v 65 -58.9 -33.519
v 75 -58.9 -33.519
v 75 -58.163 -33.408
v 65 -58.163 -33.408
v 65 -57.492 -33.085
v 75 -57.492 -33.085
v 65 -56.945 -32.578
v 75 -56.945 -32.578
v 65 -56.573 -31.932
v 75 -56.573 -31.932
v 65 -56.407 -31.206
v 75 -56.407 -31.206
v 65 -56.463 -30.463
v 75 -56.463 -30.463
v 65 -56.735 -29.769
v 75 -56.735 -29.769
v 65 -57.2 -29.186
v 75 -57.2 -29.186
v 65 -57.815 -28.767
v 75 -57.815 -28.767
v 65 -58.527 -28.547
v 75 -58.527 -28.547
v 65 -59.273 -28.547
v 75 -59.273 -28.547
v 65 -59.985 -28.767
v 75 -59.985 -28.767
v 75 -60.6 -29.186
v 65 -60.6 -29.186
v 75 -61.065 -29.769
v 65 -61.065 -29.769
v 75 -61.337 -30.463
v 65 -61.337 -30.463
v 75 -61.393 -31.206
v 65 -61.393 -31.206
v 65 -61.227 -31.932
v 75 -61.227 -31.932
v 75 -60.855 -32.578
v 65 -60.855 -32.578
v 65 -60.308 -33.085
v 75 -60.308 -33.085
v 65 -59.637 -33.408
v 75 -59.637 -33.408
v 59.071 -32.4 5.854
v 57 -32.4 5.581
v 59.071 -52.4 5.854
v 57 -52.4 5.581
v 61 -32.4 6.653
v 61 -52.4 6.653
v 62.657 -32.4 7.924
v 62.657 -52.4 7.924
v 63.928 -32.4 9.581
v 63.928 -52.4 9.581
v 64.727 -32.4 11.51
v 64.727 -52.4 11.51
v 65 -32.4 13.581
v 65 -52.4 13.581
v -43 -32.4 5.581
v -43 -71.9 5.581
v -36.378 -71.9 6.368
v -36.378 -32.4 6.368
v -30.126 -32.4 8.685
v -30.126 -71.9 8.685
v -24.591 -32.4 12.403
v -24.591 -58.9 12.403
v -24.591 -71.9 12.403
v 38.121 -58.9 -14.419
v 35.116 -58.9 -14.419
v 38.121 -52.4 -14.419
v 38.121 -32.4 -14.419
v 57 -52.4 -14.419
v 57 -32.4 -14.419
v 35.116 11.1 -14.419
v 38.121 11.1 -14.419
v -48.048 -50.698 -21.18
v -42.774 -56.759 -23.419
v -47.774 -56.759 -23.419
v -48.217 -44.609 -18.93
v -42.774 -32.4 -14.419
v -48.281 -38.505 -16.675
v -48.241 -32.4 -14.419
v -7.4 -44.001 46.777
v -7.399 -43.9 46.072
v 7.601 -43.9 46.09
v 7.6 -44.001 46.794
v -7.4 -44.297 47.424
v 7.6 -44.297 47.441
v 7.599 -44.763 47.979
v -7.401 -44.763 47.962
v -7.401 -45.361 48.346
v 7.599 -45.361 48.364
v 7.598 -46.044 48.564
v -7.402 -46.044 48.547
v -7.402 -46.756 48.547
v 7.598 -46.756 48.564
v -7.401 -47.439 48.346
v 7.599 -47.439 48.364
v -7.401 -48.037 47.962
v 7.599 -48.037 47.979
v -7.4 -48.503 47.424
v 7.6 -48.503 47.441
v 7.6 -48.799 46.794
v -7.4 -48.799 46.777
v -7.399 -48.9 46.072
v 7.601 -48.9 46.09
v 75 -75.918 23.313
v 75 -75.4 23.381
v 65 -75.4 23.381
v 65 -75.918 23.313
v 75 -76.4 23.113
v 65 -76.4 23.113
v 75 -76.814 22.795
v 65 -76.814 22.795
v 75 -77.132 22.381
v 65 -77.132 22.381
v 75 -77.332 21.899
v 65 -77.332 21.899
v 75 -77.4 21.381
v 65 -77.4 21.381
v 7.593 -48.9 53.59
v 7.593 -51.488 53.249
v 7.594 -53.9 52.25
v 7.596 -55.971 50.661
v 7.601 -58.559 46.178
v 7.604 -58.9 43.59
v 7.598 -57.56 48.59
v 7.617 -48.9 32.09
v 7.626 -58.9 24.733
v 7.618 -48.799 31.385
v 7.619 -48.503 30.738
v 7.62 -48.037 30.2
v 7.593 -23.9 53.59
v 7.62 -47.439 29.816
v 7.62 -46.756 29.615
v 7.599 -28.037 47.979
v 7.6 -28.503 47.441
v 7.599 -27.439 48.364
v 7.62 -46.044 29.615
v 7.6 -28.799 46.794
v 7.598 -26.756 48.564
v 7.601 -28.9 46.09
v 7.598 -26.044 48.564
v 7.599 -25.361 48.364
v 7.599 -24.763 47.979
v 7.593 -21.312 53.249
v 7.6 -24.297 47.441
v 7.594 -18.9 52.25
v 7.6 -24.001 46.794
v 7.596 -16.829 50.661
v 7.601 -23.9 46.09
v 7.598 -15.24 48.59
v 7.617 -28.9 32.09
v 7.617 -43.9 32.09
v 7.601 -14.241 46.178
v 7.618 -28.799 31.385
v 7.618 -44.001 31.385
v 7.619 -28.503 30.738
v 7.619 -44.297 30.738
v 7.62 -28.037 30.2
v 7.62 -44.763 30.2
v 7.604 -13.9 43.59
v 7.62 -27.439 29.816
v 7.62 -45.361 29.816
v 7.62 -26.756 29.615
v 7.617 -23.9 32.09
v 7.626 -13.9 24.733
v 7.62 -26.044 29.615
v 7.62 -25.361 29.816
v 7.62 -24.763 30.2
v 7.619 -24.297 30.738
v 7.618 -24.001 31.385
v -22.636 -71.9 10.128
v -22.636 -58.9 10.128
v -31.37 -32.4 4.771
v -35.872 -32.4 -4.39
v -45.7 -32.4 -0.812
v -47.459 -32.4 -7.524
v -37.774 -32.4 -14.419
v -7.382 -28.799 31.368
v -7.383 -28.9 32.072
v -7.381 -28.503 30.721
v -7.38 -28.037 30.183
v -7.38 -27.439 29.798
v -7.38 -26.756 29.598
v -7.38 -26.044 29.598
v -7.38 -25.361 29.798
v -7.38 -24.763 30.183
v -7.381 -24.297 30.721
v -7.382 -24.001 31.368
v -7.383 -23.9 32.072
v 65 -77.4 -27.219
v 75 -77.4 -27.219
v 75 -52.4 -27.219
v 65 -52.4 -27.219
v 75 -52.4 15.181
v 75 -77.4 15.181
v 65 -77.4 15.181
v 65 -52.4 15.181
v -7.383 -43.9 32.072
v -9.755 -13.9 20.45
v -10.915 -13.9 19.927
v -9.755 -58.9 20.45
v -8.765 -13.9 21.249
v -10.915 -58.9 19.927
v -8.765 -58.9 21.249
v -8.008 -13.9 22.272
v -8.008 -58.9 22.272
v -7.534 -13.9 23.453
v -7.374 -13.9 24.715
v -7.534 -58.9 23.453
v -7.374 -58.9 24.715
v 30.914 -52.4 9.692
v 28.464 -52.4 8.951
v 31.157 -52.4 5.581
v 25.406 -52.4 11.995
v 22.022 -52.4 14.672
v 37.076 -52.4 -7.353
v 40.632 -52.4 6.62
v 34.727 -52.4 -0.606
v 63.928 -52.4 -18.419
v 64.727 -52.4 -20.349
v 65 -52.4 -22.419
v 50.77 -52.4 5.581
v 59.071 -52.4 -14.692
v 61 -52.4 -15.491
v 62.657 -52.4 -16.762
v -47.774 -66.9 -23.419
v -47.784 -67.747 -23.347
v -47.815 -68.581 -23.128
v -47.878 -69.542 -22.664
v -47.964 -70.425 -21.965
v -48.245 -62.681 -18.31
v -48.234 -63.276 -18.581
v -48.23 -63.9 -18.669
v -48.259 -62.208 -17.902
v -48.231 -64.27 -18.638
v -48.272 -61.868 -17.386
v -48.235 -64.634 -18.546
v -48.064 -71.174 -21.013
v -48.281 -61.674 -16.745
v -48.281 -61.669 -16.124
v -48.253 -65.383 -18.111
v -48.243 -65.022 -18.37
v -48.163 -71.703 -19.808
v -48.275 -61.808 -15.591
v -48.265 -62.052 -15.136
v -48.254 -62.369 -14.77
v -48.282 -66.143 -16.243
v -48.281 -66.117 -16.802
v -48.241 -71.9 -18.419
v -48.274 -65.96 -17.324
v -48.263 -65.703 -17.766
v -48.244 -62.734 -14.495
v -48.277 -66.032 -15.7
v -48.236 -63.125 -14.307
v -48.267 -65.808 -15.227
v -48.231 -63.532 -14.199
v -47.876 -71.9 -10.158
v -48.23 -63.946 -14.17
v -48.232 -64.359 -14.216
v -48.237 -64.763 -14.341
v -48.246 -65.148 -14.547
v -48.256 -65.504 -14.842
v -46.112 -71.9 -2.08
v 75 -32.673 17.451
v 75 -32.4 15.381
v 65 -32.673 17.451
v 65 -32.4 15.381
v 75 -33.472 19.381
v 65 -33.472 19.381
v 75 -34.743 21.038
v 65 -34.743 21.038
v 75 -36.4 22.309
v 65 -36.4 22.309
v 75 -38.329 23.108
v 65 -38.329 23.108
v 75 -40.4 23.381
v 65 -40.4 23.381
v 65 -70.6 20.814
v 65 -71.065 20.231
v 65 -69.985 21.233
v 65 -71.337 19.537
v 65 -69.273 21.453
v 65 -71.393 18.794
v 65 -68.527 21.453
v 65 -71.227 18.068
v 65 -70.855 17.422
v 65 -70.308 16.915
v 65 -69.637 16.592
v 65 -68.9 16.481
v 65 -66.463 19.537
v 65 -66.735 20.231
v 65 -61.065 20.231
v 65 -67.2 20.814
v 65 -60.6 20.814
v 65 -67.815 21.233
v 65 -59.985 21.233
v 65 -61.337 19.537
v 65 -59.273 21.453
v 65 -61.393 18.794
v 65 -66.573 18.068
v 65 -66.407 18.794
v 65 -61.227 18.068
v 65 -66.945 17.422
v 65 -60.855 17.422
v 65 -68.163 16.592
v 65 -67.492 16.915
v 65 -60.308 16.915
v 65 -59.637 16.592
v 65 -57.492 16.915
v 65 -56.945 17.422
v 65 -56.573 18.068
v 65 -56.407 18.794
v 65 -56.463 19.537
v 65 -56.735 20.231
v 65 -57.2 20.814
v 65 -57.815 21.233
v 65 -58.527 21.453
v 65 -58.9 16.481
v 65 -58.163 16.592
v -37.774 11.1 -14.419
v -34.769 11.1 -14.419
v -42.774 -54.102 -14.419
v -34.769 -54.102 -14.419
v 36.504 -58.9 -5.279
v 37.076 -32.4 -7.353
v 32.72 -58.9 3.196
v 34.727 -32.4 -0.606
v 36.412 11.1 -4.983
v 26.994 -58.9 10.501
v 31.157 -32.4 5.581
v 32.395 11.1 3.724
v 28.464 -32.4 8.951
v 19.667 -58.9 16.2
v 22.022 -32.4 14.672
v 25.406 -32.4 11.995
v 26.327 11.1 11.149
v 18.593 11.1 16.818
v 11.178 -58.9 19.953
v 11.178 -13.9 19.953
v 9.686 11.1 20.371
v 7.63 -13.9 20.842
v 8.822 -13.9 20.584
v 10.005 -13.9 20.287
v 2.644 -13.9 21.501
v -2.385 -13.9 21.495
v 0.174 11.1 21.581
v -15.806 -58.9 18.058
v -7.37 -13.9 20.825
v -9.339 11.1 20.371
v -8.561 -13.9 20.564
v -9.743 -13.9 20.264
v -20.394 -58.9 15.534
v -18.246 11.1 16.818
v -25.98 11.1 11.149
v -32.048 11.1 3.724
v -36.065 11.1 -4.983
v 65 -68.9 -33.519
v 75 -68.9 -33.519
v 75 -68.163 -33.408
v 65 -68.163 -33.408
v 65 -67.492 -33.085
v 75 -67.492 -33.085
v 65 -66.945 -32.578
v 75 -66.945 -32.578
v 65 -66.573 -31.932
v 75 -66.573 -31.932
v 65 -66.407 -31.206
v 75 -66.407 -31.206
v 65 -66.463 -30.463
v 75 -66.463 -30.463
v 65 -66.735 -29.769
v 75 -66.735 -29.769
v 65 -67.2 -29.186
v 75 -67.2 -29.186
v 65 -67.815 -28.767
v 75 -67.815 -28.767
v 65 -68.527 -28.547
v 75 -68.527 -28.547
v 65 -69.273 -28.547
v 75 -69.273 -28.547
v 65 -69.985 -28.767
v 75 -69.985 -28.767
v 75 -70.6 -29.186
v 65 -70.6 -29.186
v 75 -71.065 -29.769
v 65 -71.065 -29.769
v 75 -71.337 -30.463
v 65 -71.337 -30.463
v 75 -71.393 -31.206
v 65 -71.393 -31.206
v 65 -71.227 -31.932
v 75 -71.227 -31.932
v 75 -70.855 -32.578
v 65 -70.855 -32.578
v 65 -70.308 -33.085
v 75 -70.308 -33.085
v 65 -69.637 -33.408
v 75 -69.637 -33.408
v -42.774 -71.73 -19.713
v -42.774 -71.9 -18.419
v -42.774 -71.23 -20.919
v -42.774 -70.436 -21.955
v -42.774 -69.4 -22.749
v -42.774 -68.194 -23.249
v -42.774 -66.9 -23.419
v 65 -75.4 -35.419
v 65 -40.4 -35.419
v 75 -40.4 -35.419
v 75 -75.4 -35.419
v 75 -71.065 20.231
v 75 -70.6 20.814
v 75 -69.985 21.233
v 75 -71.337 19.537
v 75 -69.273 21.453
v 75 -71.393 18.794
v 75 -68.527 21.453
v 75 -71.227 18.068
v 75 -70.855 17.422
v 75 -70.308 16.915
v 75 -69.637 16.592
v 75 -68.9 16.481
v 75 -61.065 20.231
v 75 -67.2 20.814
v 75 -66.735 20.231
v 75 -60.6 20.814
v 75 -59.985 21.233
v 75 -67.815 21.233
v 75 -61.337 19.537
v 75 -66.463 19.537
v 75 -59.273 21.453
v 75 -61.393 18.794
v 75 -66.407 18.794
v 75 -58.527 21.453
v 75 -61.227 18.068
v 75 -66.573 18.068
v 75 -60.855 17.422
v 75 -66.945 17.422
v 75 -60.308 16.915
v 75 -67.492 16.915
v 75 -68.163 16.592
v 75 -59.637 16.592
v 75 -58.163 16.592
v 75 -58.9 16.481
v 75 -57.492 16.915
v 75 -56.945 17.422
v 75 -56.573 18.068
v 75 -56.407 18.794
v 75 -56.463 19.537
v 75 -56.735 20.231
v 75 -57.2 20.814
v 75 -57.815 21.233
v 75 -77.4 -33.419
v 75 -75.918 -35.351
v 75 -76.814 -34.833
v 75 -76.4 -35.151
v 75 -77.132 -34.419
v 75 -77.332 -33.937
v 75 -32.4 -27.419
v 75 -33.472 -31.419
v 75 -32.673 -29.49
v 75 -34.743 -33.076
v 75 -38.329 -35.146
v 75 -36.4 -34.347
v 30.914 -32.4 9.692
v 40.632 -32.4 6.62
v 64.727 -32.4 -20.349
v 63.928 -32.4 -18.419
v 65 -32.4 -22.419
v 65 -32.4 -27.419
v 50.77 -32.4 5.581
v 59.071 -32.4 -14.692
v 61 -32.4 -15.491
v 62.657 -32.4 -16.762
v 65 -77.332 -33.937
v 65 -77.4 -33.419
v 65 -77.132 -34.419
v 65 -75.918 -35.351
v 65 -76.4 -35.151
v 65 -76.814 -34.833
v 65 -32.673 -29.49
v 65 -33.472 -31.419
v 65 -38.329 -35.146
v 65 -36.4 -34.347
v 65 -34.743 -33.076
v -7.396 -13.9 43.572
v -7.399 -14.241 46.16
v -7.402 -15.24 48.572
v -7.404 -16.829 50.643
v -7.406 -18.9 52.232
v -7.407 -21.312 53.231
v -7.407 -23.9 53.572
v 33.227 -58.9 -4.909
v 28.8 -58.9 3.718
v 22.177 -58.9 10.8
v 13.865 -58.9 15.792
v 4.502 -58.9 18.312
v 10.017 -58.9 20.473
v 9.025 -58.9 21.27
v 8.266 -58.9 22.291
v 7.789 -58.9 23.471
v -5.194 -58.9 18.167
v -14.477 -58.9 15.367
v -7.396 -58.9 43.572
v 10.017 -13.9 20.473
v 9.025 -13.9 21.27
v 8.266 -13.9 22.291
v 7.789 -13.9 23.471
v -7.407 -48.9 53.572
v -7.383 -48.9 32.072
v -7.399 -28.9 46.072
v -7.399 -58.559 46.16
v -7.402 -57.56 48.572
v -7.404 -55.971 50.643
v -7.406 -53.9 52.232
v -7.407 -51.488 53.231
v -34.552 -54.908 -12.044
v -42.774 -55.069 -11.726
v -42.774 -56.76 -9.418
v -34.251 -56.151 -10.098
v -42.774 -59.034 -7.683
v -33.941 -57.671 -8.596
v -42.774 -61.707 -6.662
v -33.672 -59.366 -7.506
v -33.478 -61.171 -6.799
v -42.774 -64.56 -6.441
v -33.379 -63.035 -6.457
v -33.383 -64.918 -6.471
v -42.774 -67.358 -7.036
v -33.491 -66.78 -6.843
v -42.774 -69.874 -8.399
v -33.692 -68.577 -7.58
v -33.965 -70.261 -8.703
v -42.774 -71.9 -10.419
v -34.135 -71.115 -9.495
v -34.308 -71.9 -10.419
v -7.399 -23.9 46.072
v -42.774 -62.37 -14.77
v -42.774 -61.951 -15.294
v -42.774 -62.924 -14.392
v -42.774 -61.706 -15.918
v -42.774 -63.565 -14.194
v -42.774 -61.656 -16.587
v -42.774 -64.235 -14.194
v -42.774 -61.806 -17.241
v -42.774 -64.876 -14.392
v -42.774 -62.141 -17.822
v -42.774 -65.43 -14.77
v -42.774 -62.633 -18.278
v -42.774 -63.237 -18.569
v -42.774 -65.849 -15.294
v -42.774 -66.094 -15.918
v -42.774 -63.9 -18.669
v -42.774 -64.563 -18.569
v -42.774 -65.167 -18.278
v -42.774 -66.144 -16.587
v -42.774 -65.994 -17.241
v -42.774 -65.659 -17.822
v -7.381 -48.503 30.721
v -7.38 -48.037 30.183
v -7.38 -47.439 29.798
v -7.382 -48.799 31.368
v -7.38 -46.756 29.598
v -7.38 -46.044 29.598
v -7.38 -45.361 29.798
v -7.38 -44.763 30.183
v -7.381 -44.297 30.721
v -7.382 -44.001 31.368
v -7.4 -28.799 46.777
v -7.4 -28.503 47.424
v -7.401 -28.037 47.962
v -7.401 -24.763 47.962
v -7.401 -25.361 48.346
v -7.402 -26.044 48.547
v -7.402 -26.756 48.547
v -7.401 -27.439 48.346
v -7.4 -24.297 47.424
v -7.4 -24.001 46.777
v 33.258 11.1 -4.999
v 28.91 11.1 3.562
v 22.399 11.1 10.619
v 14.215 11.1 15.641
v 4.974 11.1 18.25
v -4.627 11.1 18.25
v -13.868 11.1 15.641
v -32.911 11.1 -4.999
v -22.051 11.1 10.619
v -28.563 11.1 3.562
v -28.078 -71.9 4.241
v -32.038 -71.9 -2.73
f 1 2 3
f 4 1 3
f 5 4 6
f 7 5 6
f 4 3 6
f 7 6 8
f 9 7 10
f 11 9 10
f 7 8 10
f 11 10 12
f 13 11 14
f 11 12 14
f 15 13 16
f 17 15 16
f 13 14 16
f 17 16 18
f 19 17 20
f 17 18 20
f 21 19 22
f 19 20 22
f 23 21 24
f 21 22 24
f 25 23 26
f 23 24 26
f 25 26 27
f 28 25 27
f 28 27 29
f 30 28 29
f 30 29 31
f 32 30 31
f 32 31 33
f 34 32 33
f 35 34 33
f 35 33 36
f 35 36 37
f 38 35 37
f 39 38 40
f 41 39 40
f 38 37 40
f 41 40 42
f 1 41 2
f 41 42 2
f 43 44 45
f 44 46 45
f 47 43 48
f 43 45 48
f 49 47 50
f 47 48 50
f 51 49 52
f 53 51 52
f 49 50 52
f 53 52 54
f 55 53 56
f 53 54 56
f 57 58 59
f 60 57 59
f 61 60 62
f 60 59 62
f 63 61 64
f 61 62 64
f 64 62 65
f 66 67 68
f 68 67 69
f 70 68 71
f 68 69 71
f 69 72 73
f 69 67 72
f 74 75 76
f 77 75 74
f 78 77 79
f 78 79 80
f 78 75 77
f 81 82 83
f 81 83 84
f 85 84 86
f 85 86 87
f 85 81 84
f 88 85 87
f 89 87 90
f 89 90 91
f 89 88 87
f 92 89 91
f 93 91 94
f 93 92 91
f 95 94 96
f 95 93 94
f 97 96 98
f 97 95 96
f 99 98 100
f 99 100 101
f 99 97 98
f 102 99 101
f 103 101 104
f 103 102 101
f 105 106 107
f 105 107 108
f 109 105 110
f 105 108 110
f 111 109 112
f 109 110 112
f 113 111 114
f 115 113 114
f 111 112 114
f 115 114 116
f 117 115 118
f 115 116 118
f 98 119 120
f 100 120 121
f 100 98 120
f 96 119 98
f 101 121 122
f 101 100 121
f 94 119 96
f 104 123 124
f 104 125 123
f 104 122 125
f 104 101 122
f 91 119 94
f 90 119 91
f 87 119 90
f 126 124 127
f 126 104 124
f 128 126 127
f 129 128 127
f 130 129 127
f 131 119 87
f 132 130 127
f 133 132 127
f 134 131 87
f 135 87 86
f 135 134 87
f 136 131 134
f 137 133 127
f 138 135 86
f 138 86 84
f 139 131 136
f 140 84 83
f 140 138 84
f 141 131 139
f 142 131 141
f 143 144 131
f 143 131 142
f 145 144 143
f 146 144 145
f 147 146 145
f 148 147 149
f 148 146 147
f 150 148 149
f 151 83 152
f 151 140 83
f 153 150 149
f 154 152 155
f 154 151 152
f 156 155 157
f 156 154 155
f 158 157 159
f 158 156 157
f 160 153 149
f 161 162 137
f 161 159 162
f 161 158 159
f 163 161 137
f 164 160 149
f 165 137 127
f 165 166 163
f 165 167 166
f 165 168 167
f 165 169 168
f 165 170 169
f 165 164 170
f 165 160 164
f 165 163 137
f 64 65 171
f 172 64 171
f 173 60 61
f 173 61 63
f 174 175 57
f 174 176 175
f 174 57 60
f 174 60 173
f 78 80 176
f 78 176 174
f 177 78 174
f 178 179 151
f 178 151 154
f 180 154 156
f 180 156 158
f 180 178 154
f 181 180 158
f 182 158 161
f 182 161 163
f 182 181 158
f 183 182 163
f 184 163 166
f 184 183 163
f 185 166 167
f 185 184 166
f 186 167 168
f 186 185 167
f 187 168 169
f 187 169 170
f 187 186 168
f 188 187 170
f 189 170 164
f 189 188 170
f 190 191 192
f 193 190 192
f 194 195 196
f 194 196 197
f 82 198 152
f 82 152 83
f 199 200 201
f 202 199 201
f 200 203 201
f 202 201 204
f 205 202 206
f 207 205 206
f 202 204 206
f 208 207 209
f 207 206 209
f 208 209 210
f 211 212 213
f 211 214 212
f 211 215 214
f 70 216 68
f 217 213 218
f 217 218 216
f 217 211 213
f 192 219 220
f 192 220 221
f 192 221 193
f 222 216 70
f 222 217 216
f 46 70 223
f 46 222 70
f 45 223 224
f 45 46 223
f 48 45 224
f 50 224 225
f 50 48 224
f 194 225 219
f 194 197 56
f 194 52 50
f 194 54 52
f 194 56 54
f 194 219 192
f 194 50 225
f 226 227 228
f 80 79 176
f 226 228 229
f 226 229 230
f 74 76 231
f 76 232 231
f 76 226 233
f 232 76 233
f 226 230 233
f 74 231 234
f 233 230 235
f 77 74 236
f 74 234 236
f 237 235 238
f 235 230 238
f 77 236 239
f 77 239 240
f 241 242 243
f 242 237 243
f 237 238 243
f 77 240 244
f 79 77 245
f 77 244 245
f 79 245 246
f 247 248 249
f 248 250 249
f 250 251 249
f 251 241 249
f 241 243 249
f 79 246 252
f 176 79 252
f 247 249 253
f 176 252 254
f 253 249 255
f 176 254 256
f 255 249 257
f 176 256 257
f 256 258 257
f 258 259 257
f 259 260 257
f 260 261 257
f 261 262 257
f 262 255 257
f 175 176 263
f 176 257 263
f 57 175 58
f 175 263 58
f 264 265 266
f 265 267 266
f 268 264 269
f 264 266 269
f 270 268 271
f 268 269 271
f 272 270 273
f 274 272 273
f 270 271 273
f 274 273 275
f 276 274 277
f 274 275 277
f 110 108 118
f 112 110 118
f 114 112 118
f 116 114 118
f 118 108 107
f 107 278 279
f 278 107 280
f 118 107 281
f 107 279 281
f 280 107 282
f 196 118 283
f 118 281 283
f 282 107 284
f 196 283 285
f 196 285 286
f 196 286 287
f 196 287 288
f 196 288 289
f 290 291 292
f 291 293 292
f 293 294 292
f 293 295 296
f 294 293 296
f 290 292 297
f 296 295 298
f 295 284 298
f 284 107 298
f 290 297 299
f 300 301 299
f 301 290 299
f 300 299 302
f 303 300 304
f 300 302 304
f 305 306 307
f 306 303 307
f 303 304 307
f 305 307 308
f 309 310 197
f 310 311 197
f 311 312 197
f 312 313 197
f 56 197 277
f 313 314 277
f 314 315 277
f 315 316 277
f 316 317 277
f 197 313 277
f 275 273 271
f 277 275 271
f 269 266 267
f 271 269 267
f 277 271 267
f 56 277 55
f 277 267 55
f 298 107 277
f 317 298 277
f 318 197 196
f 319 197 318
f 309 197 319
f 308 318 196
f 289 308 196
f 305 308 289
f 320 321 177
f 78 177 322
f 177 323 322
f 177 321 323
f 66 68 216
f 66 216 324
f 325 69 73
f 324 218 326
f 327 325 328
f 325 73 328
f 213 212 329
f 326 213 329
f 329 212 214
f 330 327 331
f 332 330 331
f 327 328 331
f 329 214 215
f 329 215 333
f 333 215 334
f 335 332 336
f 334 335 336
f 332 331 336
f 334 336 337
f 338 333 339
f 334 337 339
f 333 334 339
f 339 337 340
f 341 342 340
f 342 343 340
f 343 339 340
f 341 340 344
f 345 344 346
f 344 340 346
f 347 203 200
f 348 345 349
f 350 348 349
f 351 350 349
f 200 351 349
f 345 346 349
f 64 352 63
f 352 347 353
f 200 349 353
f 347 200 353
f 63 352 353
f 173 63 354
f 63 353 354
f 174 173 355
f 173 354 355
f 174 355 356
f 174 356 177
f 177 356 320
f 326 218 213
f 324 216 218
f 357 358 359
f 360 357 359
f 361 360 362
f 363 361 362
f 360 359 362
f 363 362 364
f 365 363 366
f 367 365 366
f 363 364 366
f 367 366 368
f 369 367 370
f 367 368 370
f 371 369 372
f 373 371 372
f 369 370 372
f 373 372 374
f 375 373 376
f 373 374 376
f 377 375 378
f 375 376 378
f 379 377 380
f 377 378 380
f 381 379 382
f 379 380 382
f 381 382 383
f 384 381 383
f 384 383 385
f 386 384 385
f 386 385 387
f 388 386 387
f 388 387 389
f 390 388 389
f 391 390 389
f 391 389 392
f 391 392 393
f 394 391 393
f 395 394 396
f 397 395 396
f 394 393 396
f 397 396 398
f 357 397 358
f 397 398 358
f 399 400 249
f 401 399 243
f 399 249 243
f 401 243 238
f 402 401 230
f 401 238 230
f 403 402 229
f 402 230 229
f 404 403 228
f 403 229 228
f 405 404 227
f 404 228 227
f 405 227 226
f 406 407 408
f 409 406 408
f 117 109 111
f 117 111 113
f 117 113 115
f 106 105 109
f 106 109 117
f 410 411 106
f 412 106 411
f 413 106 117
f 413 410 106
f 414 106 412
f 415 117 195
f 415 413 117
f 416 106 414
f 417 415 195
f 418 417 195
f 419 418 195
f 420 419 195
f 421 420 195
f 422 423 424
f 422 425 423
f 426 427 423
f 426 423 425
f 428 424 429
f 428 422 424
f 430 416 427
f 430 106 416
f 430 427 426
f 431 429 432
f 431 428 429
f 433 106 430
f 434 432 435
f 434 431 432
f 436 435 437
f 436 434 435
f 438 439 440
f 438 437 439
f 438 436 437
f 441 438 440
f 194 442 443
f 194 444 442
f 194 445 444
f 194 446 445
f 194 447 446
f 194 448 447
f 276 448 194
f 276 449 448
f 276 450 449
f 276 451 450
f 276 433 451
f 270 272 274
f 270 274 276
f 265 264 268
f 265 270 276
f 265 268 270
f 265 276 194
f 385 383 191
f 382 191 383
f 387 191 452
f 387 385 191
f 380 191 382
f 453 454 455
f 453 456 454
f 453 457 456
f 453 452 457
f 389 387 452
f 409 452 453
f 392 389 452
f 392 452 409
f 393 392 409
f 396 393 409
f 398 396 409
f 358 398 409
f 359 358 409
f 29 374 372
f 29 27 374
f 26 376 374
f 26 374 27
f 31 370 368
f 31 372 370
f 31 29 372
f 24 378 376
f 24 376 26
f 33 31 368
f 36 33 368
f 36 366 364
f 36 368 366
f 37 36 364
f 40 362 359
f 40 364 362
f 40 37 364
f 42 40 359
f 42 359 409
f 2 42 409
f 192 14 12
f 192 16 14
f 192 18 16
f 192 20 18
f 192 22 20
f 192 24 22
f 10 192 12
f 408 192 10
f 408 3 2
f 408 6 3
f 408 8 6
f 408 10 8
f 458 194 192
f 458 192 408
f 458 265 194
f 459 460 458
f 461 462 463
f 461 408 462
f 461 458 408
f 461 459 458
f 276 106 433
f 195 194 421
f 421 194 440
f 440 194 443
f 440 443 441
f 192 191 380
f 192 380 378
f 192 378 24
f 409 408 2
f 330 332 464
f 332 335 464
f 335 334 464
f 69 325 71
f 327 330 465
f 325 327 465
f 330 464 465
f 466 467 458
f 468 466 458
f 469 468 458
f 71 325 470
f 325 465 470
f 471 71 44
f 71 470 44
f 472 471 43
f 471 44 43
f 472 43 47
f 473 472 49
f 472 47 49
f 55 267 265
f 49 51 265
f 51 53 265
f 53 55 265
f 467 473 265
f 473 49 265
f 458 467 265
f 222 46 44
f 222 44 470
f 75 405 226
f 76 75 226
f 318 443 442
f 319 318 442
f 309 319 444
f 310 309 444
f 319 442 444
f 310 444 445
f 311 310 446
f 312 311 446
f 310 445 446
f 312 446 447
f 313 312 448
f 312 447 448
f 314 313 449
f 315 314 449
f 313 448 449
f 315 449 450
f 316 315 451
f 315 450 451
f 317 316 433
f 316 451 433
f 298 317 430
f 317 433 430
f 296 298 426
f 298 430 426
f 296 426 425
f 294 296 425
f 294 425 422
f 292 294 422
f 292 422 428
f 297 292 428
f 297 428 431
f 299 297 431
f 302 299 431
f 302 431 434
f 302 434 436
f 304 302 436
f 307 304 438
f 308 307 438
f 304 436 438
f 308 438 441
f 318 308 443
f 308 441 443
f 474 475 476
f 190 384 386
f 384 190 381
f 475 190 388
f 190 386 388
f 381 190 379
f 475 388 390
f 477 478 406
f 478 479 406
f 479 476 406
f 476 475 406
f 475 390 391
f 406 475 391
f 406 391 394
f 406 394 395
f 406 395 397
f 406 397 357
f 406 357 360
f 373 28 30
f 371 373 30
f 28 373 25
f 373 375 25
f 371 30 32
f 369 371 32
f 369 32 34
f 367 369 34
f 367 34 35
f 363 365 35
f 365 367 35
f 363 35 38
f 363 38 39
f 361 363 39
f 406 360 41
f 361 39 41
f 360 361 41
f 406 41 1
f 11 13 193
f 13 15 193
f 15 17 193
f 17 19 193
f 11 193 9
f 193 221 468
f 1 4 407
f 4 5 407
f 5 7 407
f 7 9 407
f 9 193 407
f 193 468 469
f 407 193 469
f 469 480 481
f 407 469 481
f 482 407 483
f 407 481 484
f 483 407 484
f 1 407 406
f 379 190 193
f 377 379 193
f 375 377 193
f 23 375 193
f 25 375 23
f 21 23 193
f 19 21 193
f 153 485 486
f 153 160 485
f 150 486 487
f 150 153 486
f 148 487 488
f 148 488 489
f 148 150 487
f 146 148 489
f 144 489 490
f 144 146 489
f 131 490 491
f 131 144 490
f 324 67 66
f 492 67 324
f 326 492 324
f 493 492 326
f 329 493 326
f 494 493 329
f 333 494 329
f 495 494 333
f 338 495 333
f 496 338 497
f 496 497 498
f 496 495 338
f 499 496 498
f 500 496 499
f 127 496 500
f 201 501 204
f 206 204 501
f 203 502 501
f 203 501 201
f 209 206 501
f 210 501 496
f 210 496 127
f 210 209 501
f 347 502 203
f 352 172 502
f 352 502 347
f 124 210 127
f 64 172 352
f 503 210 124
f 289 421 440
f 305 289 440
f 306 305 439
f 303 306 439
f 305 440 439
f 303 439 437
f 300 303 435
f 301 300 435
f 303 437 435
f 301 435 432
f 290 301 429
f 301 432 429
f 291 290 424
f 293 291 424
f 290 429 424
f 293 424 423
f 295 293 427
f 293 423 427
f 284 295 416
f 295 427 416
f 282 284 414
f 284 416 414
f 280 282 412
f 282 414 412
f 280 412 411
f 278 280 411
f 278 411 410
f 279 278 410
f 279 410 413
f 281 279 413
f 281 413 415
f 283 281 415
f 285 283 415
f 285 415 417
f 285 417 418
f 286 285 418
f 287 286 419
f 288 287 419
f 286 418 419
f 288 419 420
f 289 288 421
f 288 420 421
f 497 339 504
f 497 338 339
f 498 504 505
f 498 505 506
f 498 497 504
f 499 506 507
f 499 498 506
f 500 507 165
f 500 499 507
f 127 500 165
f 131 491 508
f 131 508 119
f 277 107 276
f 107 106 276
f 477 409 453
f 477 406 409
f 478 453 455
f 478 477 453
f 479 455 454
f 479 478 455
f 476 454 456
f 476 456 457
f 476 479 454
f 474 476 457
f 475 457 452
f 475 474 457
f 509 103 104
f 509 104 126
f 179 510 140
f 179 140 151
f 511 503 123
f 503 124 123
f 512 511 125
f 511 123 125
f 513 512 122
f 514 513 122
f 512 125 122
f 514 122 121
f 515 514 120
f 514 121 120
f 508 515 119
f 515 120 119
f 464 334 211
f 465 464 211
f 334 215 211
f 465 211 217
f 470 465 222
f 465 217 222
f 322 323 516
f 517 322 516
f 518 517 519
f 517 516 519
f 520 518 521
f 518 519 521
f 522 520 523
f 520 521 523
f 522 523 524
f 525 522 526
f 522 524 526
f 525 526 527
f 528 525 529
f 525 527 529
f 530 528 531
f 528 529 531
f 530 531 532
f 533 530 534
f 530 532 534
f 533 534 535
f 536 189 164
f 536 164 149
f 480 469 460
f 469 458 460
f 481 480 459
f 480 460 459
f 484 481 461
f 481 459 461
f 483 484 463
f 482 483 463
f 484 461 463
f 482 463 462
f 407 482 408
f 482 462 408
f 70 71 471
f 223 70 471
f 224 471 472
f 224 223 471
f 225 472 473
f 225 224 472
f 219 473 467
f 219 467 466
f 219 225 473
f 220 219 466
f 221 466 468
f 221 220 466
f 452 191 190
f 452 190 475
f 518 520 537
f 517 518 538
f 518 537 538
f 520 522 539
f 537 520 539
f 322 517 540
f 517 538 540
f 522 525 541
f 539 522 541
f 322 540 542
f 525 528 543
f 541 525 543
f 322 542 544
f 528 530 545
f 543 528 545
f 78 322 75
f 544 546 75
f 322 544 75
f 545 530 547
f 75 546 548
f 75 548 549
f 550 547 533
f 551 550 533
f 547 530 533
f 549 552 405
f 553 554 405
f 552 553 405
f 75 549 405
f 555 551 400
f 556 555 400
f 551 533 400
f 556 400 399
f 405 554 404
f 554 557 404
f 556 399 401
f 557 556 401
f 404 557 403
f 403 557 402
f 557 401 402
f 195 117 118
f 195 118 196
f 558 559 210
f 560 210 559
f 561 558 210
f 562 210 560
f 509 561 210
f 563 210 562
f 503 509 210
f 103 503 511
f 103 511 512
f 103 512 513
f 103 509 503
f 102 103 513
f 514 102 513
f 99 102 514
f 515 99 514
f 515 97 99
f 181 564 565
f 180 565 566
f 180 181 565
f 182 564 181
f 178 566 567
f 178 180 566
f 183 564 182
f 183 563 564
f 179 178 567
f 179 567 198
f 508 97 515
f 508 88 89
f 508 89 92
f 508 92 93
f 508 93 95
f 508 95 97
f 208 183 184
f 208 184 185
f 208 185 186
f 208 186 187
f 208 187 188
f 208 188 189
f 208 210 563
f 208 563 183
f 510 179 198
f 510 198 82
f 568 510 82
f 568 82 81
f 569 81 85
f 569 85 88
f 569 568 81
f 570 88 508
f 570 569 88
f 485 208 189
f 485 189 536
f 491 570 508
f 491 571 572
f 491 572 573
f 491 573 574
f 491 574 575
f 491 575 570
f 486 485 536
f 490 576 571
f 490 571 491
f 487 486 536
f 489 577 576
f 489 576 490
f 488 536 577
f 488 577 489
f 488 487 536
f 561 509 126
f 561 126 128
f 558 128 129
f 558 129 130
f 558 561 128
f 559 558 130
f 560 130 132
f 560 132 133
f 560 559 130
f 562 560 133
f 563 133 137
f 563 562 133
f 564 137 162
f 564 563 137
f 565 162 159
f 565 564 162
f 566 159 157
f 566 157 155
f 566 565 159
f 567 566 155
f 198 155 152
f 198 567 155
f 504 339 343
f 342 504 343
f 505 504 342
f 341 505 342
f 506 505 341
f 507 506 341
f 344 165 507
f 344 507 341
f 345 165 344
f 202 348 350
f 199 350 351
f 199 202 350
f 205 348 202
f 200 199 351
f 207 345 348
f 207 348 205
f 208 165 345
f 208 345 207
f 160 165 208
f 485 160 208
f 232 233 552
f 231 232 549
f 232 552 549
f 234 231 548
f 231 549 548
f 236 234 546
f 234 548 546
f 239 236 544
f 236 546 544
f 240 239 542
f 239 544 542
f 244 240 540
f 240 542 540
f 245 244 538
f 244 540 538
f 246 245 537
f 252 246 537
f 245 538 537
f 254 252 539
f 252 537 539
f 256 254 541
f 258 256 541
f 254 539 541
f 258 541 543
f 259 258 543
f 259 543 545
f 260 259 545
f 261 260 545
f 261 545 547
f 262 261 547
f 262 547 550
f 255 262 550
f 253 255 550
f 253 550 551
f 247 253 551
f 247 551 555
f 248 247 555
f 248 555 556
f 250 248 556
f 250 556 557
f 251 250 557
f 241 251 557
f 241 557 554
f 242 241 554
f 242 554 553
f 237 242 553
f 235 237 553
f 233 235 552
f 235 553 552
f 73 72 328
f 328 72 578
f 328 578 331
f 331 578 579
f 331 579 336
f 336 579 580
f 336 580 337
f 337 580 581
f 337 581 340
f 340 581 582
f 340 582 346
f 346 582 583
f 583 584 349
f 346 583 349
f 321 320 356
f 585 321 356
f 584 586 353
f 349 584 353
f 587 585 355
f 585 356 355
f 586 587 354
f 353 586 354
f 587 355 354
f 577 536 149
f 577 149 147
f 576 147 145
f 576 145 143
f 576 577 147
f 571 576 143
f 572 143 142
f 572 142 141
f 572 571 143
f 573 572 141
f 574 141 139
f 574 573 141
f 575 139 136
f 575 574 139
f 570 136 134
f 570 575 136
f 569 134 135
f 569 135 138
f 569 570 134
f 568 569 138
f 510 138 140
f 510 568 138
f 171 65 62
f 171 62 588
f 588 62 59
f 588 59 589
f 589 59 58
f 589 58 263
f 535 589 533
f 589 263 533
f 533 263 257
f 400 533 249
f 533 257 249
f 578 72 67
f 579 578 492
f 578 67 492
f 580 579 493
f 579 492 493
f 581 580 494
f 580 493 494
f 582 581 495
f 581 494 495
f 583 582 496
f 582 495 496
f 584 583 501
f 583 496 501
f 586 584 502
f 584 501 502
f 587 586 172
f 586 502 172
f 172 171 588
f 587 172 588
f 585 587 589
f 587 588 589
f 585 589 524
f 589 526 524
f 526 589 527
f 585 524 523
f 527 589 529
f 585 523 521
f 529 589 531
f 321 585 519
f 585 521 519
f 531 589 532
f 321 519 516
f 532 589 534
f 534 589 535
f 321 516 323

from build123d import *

# Parameters (mm, degrees)
BOSS_EXTRU_1_DEPTH             = 70
BOSS_EXTRU_2_START             = -45
BOSS_EXTRU_2_DEPTH             = 45
ENL_V_MAT_EXTRU_1_DEPTH        = 15
BOSS_EXTRU_6_START             = -20
BOSS_EXTRU_6_DEPTH             = 20
ESQUISSE10_W                   = 8.2
ESQUISSE10_H                   = 25
ESQUISSE10_R                   = 2.5
BOSS_EXTRU_7_DEPTH             = 10
BOSS_EXTRU_8_DEPTH             = 8
BOSS_EXTRU_8_DIRECTION_2_REACH = 120.835
ESQUISSE12_R                   = 10
ENL_V_MAT_EXTRU_2_DEPTH        = 42.773769853
ESQUISSE13_R                   = 2.25
ENL_V_MAT_EXTRU_3_DEPTH        = 65
CONG_5_R                       = 5
CONG_6_R                       = 50
CONG_7_R                       = 5
CONG_8_R                       = 8
CONG_9_R                       = 8
CONG_10_R                      = 2
CONG_11_R                      = 10


with BuildPart() as part:
    # Esquisse1 → Boss.-Extru.1 (new body)
    with BuildSketch(Plane(origin=(0, 11.1, 0), x_dir=(0, 0, 1), z_dir=(0, -1, 0))):
        with BuildLine():
            Line((-14.419058892, 37.773769853), (-14.419058892, 34.76924835))
            ThreePointArc((-14.419058892, 34.76924835), (18.580941108, -0.173562069), (-14.419058892, -35.116372489))
            Line((-14.419058892, -35.116372489), (-14.419058892, -38.120893991))
            ThreePointArc((-14.419058892, -38.120893991), (21.580941108, -0.173562069), (-14.419058892, 37.773769853))
        make_face()
    extrude(amount=BOSS_EXTRU_1_DEPTH)

    # Esquisse2 → Boss.-Extru.2 (add)
    with BuildSketch(Plane.XZ.offset(58.9).offset(BOSS_EXTRU_2_START)):
        with BuildLine():
            Line((-7.36953704, 20.824754767), (-7.407428488, 53.572216152))
            Line((-7.407428488, 53.572216152), (7.592561471, 53.589572347))
            Line((7.592561471, 53.589572347), (7.630452918, 20.842110962))
            ThreePointArc((7.630452918, 20.842110962), (0.129593041, 21.580915671), (-7.36953704, 20.824754767))
        make_face()
    extrude(amount=BOSS_EXTRU_2_DEPTH)

    # Esquisse3 → Enlèv. mat.-Extru.1 (cut)
    with BuildSketch(Plane(origin=(-7.345431289, 0, -0.008499255), x_dir=(-0.0011570796870464528, 0, 0.999999330583075), z_dir=(-0.999999330583075, 0, -0.0011570796870464528))):
        with BuildLine():
            Line((46.080751274, -28.9), (32.080751274, -28.9))
            ThreePointArc((32.080751274, -28.9), (29.580751274, -26.4), (32.080751274, -23.9))
            Line((32.080751274, -23.9), (46.080751274, -23.9))
            ThreePointArc((46.080751274, -23.9), (48.580751274, -26.4), (46.080751274, -28.9))
        make_face()
        with BuildLine():
            Line((32.080751274, -43.9), (46.080751274, -43.9))
            ThreePointArc((46.080751274, -43.9), (48.580751274, -46.4), (46.080751274, -48.9))
            Line((46.080751274, -48.9), (32.080751274, -48.9))
            ThreePointArc((32.080751274, -48.9), (29.580751274, -46.4), (32.080751274, -43.9))
        make_face()
    extrude(amount=-ENL_V_MAT_EXTRU_1_DEPTH, mode=Mode.SUBTRACT)

    # Esquisse5 → Boss.-Extru.6 (add)
    with BuildSketch(Plane.XZ.offset(52.4).offset(BOSS_EXTRU_6_START)):
        with BuildLine():
            Line((38.120893991, -14.419058892), (65, -14.419058892))
            Line((65, -14.419058892), (65, -35.419058892))
            Line((65, -35.419058892), (75, -35.419058892))
            Line((75, -35.419058892), (75, 23.380941108))
            Line((75, 23.380941108), (65, 23.380941108))
            Line((65, 23.380941108), (65, 5.580941108))
            Line((65, 5.580941108), (31.157428839, 5.580941108))
            ThreePointArc((31.157428839, 5.580941108), (36.060572787, -3.924161464), (38.120893991, -14.419058892))
        make_face()
    extrude(amount=BOSS_EXTRU_6_DEPTH)

    # Esquisse10 → Boss.-Extru.7 (add)
    # profile 1 of 2: a face of its own
    with BuildSketch(Plane(origin=(75, 0, 0), x_dir=(0, 0, -1), z_dir=(1, 0, 0))):
        with Locations((-19.280941108, -64.9)):
            Rectangle(ESQUISSE10_W, ESQUISSE10_H)
        with Locations((-18.980941108, -58.9)):
            Circle(ESQUISSE10_R, mode=Mode.SUBTRACT)
        with Locations((-18.980941108, -68.9)):
            Circle(ESQUISSE10_R, mode=Mode.SUBTRACT)
    # profile 2 of 2: a face of its own
    with BuildSketch(Plane(origin=(75, 0, 0), x_dir=(0, 0, -1), z_dir=(1, 0, 0))):
        with Locations((31.319058892, -64.9)):
            Rectangle(ESQUISSE10_W, ESQUISSE10_H)
        with Locations((31.019058892, -58.9)):
            Circle(ESQUISSE10_R, mode=Mode.SUBTRACT)
        with Locations((31.019058892, -68.9)):
            Circle(ESQUISSE10_R, mode=Mode.SUBTRACT)
    extrude(amount=-BOSS_EXTRU_7_DEPTH)

    # Esquisse11 → Boss.-Extru.8 (add)
    with BuildSketch(Plane(origin=(0, -63.9, 0), x_dir=(0, 0, 1), z_dir=(0, -1, 0))):
        with BuildLine():
            Line((-14.419058892, 37.773769853), (-14.419058892, 42.773769853))
            Line((-14.419058892, 42.773769853), (-23.419058892, 42.773769853))
            Line((-23.419058892, 42.773769853), (-23.419058892, 47.773769853))
            ThreePointArc((-23.419058892, 47.773769853), (-8.548386036, 47.638561364), (5.580941108, 42.999886235))
            ThreePointArc((5.580941108, 42.999886235), (7.341400367, 33.183529475), (12.403351613, 24.590699533))
            Line((12.403351613, 24.590699533), (10.127898152, 22.635626249))
            ThreePointArc((10.127898152, 22.635626249), (-0.909758926, 31.202569218), (-14.419058892, 34.76924835))
            Line((-14.419058892, 34.76924835), (-14.419058892, 37.773769853))
        make_face()
    extrude(amount=BOSS_EXTRU_8_DEPTH)

    # Boss.-Extru.8 direction 2: up to this face of the body (flat: up to its plane)
    boss_extru_8_direction_2_end = Plane(part.part.faces().sort_by_distance((60.159129099, -32.4, -5.026373369))[0])
    # Esquisse11 → Boss.-Extru.8 direction 2 (add, up to the picked face)
    with BuildSketch(Plane(origin=(0, -63.9, 0), x_dir=(0, 0, 1), z_dir=(0, -1, 0)), mode=Mode.PRIVATE) as boss_extru_8_direction_2_sk1:
        with BuildLine():
            Line((-14.419058892, 37.773769853), (-14.419058892, 42.773769853))
            Line((-14.419058892, 42.773769853), (-23.419058892, 42.773769853))
            Line((-23.419058892, 42.773769853), (-23.419058892, 47.773769853))
            ThreePointArc((-23.419058892, 47.773769853), (-8.548386036, 47.638561364), (5.580941108, 42.999886235))
            ThreePointArc((5.580941108, 42.999886235), (7.341400367, 33.183529475), (12.403351613, 24.590699533))
            Line((12.403351613, 24.590699533), (10.127898152, 22.635626249))
            ThreePointArc((10.127898152, 22.635626249), (-0.909758926, 31.202569218), (-14.419058892, 34.76924835))
            Line((-14.419058892, 34.76924835), (-14.419058892, 37.773769853))
        make_face()
    boss_extru_8_direction_2_tool1 = split(extrude(boss_extru_8_direction_2_sk1.sketch, amount=-BOSS_EXTRU_8_DIRECTION_2_REACH, mode=Mode.PRIVATE), bisect_by=boss_extru_8_direction_2_end, keep=Keep.BOTH, mode=Mode.PRIVATE)
    add(boss_extru_8_direction_2_tool1.solids().sort_by(Axis((-38.873879, -63.9, -4.751333), (0, 1, 0)))[0])

    # Esquisse12 → Enlèv. mat.-Extru.2 (cut)
    with BuildSketch(Plane(origin=(0, 0, 0), x_dir=(0, 0, -1), z_dir=(1, 0, 0))):
        with Locations((16.419058892, -63.9)):
            Circle(ESQUISSE12_R)
    extrude(amount=-ENL_V_MAT_EXTRU_2_DEPTH, mode=Mode.SUBTRACT)

    # Esquisse13 → Enlèv. mat.-Extru.3 (cut)
    with BuildSketch(Plane(origin=(0, 0, 0), x_dir=(0, 0, -1), z_dir=(1, 0, 0))):
        with Locations((16.419058892, -63.9)):
            Circle(ESQUISSE13_R)
        Polygon((14.419058892, -32.4), (23.419058892, -32.4), (23.419058892, -56.758571571), align=None)
    extrude(amount=-ENL_V_MAT_EXTRU_3_DEPTH, mode=Mode.SUBTRACT)

    # Congé5
    cong_5_edges = [part.edges().sort_by_distance(p)[0] for p in [
        (-45.273769853, -71.9, -23.419058892),
    ]]
    fillet(cong_5_edges, radius=CONG_5_R)

    # Congé6
    cong_6_edges = [part.edges().sort_by_distance(p)[0] for p in [
        (31.157428839, -42.4, 5.580941108),
    ]]
    fillet(cong_6_edges, radius=CONG_6_R)

    # Congé7
    cong_7_edges = [part.edges().sort_by_distance(p)[0] for p in [
        (7.630452918, -36.4, 20.842110962),
        (-7.36953704, -36.4, 20.824754767),
    ]]
    fillet(cong_7_edges, radius=CONG_7_R)

    # Congé8
    cong_8_edges = [part.edges().sort_by_distance(p)[0] for p in [
        (65, -42.4, 5.580941108),
        (65, -42.4, -14.419058892),
    ]]
    fillet(cong_8_edges, radius=CONG_8_R)

    # Congé9
    cong_9_edges = [part.edges().sort_by_distance(p)[0] for p in [
        (70, -32.4, 23.380941108),
        (70, -32.4, -35.419058892),
    ]]
    fillet(cong_9_edges, radius=CONG_9_R)

    # Congé10
    cong_10_edges = [part.edges().sort_by_distance(p)[0] for p in [
        (70, -77.4, 23.380941108),
        (70, -77.4, -35.419058892),
    ]]
    fillet(cong_10_edges, radius=CONG_10_R)

    # Congé11
    cong_11_edges = [part.edges().sort_by_distance(p)[0] for p in [
        (0.092566491, -13.9, 53.580894249),
        (0.092566491, -58.9, 53.580894249),
    ]]
    fillet(cong_11_edges, radius=CONG_11_R)


solid = part.part
